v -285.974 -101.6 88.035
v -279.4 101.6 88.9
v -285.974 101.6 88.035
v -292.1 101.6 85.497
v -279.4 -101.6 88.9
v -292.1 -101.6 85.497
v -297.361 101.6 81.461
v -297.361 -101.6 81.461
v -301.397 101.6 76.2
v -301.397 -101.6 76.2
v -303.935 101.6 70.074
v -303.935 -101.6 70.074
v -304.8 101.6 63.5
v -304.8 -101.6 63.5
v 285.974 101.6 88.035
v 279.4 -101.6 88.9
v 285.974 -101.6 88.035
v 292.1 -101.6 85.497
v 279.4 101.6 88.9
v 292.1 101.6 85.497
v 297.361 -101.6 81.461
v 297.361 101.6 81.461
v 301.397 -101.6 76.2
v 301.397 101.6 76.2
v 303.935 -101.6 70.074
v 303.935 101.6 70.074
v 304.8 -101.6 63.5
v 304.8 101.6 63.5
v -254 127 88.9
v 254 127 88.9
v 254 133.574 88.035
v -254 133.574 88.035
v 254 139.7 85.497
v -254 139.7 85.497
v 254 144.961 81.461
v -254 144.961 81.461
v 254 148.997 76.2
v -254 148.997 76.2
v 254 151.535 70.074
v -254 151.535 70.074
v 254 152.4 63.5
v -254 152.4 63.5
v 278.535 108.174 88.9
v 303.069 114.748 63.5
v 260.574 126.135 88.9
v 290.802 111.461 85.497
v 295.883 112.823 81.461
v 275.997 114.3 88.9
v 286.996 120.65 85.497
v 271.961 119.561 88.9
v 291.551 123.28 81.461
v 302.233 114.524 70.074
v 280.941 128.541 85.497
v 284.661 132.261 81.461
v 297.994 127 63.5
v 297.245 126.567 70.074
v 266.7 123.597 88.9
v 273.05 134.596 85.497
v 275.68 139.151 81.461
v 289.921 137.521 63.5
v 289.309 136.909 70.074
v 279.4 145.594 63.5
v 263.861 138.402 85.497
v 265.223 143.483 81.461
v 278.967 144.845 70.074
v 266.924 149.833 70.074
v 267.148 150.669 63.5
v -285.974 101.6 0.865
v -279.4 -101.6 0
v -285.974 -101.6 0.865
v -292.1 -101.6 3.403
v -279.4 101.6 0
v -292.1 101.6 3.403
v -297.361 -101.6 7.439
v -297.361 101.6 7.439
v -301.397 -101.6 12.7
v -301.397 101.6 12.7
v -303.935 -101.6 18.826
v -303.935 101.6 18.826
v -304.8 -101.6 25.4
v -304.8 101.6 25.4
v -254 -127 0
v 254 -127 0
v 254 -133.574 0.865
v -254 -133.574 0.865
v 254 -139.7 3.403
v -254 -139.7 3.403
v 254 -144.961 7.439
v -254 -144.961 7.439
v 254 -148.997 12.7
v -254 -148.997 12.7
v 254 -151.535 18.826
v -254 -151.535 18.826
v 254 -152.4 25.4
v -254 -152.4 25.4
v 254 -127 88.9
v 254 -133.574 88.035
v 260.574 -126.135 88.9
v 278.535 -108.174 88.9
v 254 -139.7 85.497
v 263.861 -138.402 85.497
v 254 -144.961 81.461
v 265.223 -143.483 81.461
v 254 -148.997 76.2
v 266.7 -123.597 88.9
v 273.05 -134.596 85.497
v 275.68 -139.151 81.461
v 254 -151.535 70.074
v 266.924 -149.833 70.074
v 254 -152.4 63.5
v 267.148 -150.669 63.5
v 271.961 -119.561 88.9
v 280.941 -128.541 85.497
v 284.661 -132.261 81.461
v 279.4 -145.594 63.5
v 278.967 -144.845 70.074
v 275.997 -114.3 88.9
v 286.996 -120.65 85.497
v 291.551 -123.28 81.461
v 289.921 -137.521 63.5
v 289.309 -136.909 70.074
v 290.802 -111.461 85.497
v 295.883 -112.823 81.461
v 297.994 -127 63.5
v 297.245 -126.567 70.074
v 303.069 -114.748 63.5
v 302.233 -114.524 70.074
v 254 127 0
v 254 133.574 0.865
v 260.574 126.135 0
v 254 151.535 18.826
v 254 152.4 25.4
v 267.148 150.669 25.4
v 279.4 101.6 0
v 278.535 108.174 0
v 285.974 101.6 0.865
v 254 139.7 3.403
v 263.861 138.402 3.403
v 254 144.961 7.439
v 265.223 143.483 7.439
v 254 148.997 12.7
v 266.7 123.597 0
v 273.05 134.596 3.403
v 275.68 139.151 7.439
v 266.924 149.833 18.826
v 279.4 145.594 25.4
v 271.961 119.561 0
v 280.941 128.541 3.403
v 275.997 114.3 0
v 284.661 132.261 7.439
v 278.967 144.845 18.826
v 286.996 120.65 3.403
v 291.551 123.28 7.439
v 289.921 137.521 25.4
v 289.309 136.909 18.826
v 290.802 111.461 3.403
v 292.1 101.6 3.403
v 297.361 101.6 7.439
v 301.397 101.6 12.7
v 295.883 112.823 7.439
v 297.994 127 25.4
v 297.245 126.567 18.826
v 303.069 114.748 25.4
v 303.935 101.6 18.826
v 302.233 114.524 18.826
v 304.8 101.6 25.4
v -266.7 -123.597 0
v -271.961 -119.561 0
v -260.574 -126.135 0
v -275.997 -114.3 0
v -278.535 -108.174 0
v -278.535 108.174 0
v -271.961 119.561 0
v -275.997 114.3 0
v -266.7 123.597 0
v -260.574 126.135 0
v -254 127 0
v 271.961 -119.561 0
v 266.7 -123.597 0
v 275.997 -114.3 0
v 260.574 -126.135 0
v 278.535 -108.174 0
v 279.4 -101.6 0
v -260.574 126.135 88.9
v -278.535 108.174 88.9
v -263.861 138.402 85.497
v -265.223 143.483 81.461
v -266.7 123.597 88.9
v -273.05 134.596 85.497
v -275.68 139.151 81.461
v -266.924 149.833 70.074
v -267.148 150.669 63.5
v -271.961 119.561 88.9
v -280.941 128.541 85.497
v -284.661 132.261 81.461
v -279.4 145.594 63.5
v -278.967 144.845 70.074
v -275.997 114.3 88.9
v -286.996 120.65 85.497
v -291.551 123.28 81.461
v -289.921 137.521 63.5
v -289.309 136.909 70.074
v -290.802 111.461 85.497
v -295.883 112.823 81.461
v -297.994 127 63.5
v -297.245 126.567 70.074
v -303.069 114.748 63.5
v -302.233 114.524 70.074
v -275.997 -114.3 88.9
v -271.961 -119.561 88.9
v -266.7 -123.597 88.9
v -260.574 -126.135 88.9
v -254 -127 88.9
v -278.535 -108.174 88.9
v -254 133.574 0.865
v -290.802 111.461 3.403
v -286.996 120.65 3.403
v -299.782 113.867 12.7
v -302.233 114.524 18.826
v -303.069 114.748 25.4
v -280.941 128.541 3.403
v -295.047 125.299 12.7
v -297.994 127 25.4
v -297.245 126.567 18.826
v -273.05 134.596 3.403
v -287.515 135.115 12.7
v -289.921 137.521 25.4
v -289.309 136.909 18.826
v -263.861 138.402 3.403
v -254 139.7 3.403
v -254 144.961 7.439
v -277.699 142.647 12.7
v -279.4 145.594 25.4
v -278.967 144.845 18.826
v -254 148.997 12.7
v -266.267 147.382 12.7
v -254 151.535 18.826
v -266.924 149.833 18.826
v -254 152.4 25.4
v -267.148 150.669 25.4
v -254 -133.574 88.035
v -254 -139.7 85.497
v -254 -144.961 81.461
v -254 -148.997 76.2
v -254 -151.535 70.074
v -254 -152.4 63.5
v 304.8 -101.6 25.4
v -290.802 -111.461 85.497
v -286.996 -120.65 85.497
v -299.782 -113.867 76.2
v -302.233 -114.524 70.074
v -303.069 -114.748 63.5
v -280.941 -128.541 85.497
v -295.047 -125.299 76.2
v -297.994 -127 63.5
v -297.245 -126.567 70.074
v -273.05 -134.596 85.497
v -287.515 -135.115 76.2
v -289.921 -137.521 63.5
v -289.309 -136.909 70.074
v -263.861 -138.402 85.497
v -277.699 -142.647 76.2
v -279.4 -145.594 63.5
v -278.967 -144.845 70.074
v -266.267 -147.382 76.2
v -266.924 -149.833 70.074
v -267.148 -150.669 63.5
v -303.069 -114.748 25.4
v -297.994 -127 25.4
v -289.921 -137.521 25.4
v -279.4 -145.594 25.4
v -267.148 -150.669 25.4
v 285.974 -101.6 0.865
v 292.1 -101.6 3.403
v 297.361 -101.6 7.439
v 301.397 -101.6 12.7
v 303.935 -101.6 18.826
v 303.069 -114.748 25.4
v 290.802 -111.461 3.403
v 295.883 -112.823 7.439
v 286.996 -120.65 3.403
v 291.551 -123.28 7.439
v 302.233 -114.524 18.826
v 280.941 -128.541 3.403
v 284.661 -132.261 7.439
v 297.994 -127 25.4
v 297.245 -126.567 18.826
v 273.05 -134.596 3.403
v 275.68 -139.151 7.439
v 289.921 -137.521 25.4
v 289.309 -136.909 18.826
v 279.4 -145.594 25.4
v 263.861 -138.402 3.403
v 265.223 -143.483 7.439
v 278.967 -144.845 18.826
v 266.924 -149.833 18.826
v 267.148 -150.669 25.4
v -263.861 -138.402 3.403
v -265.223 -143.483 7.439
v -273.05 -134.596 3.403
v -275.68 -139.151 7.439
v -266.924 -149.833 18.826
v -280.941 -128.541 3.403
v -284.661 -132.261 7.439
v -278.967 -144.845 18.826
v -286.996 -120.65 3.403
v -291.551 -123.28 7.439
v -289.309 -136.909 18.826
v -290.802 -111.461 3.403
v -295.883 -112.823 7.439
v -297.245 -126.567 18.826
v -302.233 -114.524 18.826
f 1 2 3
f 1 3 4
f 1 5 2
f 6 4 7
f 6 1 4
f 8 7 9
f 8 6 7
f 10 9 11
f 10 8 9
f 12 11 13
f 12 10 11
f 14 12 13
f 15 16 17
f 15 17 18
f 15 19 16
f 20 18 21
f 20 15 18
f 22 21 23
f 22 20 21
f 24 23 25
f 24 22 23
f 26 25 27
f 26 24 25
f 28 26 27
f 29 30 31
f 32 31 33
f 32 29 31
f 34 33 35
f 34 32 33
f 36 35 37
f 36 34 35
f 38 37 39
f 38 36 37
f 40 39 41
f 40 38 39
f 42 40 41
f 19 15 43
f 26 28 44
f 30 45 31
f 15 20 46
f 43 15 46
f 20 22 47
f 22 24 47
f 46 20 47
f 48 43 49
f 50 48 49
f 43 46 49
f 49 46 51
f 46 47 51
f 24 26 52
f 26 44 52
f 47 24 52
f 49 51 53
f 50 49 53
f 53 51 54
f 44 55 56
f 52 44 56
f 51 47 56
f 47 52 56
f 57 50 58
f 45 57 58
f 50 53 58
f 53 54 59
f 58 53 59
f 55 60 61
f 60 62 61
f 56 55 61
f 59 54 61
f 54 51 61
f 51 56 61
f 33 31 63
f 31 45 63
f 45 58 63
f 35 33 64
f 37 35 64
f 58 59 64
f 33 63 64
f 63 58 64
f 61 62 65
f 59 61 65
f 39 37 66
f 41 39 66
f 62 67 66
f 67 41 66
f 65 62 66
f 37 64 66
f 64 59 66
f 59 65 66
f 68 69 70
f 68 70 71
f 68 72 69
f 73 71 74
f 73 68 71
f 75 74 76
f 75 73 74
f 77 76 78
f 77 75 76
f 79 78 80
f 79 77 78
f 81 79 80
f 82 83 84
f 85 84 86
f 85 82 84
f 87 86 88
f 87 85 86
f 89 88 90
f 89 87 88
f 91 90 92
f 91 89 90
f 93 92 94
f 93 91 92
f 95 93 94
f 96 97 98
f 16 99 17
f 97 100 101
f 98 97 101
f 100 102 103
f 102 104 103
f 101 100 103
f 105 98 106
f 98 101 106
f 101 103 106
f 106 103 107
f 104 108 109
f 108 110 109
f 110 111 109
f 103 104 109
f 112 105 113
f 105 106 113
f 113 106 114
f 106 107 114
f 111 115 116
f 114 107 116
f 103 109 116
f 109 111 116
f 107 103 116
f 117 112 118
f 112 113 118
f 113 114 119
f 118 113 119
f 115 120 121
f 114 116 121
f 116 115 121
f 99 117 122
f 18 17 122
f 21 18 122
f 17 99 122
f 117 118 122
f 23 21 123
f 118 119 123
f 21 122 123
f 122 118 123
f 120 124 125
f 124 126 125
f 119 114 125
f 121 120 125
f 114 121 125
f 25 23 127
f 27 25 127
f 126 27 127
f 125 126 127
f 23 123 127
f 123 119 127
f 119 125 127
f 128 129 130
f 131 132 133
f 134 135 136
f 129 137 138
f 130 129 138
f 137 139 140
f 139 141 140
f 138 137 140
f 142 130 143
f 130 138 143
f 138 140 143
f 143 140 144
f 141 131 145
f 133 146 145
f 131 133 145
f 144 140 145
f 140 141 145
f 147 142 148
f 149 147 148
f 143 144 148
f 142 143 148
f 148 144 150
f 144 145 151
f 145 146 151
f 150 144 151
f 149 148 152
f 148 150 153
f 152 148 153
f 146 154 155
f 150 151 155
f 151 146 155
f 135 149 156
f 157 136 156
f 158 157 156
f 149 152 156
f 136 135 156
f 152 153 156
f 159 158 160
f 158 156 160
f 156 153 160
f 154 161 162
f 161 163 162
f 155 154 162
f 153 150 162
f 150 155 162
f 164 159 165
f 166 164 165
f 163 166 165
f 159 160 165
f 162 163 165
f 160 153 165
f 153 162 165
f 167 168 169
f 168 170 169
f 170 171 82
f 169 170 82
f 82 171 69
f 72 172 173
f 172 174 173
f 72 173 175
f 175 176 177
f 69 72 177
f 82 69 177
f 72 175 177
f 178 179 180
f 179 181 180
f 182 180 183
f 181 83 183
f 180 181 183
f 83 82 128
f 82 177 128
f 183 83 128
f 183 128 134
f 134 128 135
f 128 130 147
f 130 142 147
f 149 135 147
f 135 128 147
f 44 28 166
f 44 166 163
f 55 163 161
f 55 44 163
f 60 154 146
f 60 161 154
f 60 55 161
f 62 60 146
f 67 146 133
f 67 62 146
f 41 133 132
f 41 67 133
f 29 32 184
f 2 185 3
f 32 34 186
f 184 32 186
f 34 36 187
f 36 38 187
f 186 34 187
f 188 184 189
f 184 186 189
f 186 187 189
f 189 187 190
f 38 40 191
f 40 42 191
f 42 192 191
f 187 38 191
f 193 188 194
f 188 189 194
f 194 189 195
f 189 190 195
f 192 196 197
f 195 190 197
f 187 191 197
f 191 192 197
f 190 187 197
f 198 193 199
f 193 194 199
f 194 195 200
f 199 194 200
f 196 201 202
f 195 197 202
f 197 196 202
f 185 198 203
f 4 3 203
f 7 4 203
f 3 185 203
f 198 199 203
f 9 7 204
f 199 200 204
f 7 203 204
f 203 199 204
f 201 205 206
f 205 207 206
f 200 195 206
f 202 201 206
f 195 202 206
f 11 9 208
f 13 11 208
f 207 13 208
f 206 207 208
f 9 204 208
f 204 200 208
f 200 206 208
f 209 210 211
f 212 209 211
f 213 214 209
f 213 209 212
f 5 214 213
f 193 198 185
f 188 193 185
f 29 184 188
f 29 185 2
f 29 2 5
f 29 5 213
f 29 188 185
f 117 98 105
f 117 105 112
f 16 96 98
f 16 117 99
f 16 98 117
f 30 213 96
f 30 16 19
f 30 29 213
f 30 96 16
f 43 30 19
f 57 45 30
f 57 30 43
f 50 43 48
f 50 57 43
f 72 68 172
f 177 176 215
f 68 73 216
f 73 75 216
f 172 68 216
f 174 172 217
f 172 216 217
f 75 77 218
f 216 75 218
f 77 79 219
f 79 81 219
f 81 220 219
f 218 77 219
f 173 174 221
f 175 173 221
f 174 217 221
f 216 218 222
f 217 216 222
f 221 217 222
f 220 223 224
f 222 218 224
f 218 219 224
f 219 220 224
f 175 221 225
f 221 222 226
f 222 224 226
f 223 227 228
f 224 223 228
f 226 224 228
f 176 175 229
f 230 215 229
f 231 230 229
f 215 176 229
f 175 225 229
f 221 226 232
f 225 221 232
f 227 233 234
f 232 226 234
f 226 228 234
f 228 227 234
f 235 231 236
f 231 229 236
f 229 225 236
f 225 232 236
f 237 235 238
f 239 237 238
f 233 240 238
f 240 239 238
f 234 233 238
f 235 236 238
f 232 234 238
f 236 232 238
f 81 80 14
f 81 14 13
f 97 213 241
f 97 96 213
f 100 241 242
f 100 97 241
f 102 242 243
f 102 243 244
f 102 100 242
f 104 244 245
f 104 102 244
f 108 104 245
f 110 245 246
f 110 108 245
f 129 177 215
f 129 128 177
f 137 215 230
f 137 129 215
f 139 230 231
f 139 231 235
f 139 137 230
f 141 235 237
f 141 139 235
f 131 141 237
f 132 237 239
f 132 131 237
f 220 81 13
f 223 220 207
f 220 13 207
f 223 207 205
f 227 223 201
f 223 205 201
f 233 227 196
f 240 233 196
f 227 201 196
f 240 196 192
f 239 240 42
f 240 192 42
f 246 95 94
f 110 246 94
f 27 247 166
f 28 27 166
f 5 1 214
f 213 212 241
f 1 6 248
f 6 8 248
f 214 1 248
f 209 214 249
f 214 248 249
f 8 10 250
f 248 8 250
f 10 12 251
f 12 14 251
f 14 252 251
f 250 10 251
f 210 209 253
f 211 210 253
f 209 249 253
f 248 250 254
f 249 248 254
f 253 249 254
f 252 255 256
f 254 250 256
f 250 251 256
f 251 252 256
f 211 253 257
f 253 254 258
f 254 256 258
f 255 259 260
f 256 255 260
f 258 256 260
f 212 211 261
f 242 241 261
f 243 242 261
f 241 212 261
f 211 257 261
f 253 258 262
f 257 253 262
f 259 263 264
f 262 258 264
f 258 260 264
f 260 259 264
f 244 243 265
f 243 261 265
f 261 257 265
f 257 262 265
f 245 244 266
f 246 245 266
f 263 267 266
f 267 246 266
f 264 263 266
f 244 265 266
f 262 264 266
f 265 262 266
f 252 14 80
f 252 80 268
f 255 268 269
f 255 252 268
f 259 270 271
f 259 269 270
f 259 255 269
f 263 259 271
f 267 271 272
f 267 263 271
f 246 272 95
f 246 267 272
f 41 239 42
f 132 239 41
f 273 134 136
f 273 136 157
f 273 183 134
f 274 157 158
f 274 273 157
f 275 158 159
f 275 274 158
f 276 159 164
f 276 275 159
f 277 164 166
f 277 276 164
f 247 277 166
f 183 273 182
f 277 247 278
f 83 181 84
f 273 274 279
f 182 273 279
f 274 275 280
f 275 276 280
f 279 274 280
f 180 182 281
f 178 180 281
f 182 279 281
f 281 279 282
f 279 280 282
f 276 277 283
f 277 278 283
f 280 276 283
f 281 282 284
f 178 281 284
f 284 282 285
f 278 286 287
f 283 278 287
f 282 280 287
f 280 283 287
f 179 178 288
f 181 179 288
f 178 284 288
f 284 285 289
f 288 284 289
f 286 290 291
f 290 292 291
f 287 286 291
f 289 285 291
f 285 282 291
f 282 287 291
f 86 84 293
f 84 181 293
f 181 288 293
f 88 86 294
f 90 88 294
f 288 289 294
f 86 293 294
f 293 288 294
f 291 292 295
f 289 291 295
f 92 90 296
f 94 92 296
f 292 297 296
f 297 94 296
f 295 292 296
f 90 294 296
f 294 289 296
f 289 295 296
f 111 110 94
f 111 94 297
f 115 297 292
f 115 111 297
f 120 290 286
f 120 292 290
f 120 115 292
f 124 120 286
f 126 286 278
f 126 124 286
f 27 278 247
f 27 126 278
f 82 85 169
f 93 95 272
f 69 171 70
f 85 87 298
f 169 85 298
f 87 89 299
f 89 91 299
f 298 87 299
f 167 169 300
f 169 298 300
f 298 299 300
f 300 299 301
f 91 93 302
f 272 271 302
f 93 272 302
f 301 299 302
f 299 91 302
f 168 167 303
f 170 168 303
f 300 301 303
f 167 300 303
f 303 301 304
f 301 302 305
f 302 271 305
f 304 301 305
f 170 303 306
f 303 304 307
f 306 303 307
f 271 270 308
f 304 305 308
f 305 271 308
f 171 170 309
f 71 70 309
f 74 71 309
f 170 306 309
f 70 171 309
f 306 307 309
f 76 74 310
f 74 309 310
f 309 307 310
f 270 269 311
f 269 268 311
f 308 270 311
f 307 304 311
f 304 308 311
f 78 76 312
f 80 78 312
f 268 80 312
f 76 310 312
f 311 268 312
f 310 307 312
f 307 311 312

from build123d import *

# Parameters (mm, degrees)
F0_W     = 609.6
F0_H     = 304.8
F1_DEPTH = 88.9
F2_R     = 50.8
F3_R     = 25.4


with BuildPart() as f1:
    # F0 (on Top) → F1 (new body)
    with BuildSketch(Plane.XY):
        Rectangle(F0_W, F0_H)
    extrude(amount=F1_DEPTH)

    # F2
    f2_edges = [f1.edges().sort_by_distance(p)[0] for p in [
        (-304.8, 152.4, 44.45),
        (-304.8, -152.4, 44.45),
        (304.8, -152.4, 44.45),
        (304.8, 152.4, 44.45),
    ]]
    fillet(f2_edges, radius=F2_R)

    # F3
    f3_edges = [f1.edges().sort_by_distance(p)[0] for p in [
        (0, -152.4, 88.9),
        (0, 152.4, 88.9),
        (0, 152.4, 0),
    ]]
    fillet(f3_edges, radius=F3_R)


solid = f1.part
